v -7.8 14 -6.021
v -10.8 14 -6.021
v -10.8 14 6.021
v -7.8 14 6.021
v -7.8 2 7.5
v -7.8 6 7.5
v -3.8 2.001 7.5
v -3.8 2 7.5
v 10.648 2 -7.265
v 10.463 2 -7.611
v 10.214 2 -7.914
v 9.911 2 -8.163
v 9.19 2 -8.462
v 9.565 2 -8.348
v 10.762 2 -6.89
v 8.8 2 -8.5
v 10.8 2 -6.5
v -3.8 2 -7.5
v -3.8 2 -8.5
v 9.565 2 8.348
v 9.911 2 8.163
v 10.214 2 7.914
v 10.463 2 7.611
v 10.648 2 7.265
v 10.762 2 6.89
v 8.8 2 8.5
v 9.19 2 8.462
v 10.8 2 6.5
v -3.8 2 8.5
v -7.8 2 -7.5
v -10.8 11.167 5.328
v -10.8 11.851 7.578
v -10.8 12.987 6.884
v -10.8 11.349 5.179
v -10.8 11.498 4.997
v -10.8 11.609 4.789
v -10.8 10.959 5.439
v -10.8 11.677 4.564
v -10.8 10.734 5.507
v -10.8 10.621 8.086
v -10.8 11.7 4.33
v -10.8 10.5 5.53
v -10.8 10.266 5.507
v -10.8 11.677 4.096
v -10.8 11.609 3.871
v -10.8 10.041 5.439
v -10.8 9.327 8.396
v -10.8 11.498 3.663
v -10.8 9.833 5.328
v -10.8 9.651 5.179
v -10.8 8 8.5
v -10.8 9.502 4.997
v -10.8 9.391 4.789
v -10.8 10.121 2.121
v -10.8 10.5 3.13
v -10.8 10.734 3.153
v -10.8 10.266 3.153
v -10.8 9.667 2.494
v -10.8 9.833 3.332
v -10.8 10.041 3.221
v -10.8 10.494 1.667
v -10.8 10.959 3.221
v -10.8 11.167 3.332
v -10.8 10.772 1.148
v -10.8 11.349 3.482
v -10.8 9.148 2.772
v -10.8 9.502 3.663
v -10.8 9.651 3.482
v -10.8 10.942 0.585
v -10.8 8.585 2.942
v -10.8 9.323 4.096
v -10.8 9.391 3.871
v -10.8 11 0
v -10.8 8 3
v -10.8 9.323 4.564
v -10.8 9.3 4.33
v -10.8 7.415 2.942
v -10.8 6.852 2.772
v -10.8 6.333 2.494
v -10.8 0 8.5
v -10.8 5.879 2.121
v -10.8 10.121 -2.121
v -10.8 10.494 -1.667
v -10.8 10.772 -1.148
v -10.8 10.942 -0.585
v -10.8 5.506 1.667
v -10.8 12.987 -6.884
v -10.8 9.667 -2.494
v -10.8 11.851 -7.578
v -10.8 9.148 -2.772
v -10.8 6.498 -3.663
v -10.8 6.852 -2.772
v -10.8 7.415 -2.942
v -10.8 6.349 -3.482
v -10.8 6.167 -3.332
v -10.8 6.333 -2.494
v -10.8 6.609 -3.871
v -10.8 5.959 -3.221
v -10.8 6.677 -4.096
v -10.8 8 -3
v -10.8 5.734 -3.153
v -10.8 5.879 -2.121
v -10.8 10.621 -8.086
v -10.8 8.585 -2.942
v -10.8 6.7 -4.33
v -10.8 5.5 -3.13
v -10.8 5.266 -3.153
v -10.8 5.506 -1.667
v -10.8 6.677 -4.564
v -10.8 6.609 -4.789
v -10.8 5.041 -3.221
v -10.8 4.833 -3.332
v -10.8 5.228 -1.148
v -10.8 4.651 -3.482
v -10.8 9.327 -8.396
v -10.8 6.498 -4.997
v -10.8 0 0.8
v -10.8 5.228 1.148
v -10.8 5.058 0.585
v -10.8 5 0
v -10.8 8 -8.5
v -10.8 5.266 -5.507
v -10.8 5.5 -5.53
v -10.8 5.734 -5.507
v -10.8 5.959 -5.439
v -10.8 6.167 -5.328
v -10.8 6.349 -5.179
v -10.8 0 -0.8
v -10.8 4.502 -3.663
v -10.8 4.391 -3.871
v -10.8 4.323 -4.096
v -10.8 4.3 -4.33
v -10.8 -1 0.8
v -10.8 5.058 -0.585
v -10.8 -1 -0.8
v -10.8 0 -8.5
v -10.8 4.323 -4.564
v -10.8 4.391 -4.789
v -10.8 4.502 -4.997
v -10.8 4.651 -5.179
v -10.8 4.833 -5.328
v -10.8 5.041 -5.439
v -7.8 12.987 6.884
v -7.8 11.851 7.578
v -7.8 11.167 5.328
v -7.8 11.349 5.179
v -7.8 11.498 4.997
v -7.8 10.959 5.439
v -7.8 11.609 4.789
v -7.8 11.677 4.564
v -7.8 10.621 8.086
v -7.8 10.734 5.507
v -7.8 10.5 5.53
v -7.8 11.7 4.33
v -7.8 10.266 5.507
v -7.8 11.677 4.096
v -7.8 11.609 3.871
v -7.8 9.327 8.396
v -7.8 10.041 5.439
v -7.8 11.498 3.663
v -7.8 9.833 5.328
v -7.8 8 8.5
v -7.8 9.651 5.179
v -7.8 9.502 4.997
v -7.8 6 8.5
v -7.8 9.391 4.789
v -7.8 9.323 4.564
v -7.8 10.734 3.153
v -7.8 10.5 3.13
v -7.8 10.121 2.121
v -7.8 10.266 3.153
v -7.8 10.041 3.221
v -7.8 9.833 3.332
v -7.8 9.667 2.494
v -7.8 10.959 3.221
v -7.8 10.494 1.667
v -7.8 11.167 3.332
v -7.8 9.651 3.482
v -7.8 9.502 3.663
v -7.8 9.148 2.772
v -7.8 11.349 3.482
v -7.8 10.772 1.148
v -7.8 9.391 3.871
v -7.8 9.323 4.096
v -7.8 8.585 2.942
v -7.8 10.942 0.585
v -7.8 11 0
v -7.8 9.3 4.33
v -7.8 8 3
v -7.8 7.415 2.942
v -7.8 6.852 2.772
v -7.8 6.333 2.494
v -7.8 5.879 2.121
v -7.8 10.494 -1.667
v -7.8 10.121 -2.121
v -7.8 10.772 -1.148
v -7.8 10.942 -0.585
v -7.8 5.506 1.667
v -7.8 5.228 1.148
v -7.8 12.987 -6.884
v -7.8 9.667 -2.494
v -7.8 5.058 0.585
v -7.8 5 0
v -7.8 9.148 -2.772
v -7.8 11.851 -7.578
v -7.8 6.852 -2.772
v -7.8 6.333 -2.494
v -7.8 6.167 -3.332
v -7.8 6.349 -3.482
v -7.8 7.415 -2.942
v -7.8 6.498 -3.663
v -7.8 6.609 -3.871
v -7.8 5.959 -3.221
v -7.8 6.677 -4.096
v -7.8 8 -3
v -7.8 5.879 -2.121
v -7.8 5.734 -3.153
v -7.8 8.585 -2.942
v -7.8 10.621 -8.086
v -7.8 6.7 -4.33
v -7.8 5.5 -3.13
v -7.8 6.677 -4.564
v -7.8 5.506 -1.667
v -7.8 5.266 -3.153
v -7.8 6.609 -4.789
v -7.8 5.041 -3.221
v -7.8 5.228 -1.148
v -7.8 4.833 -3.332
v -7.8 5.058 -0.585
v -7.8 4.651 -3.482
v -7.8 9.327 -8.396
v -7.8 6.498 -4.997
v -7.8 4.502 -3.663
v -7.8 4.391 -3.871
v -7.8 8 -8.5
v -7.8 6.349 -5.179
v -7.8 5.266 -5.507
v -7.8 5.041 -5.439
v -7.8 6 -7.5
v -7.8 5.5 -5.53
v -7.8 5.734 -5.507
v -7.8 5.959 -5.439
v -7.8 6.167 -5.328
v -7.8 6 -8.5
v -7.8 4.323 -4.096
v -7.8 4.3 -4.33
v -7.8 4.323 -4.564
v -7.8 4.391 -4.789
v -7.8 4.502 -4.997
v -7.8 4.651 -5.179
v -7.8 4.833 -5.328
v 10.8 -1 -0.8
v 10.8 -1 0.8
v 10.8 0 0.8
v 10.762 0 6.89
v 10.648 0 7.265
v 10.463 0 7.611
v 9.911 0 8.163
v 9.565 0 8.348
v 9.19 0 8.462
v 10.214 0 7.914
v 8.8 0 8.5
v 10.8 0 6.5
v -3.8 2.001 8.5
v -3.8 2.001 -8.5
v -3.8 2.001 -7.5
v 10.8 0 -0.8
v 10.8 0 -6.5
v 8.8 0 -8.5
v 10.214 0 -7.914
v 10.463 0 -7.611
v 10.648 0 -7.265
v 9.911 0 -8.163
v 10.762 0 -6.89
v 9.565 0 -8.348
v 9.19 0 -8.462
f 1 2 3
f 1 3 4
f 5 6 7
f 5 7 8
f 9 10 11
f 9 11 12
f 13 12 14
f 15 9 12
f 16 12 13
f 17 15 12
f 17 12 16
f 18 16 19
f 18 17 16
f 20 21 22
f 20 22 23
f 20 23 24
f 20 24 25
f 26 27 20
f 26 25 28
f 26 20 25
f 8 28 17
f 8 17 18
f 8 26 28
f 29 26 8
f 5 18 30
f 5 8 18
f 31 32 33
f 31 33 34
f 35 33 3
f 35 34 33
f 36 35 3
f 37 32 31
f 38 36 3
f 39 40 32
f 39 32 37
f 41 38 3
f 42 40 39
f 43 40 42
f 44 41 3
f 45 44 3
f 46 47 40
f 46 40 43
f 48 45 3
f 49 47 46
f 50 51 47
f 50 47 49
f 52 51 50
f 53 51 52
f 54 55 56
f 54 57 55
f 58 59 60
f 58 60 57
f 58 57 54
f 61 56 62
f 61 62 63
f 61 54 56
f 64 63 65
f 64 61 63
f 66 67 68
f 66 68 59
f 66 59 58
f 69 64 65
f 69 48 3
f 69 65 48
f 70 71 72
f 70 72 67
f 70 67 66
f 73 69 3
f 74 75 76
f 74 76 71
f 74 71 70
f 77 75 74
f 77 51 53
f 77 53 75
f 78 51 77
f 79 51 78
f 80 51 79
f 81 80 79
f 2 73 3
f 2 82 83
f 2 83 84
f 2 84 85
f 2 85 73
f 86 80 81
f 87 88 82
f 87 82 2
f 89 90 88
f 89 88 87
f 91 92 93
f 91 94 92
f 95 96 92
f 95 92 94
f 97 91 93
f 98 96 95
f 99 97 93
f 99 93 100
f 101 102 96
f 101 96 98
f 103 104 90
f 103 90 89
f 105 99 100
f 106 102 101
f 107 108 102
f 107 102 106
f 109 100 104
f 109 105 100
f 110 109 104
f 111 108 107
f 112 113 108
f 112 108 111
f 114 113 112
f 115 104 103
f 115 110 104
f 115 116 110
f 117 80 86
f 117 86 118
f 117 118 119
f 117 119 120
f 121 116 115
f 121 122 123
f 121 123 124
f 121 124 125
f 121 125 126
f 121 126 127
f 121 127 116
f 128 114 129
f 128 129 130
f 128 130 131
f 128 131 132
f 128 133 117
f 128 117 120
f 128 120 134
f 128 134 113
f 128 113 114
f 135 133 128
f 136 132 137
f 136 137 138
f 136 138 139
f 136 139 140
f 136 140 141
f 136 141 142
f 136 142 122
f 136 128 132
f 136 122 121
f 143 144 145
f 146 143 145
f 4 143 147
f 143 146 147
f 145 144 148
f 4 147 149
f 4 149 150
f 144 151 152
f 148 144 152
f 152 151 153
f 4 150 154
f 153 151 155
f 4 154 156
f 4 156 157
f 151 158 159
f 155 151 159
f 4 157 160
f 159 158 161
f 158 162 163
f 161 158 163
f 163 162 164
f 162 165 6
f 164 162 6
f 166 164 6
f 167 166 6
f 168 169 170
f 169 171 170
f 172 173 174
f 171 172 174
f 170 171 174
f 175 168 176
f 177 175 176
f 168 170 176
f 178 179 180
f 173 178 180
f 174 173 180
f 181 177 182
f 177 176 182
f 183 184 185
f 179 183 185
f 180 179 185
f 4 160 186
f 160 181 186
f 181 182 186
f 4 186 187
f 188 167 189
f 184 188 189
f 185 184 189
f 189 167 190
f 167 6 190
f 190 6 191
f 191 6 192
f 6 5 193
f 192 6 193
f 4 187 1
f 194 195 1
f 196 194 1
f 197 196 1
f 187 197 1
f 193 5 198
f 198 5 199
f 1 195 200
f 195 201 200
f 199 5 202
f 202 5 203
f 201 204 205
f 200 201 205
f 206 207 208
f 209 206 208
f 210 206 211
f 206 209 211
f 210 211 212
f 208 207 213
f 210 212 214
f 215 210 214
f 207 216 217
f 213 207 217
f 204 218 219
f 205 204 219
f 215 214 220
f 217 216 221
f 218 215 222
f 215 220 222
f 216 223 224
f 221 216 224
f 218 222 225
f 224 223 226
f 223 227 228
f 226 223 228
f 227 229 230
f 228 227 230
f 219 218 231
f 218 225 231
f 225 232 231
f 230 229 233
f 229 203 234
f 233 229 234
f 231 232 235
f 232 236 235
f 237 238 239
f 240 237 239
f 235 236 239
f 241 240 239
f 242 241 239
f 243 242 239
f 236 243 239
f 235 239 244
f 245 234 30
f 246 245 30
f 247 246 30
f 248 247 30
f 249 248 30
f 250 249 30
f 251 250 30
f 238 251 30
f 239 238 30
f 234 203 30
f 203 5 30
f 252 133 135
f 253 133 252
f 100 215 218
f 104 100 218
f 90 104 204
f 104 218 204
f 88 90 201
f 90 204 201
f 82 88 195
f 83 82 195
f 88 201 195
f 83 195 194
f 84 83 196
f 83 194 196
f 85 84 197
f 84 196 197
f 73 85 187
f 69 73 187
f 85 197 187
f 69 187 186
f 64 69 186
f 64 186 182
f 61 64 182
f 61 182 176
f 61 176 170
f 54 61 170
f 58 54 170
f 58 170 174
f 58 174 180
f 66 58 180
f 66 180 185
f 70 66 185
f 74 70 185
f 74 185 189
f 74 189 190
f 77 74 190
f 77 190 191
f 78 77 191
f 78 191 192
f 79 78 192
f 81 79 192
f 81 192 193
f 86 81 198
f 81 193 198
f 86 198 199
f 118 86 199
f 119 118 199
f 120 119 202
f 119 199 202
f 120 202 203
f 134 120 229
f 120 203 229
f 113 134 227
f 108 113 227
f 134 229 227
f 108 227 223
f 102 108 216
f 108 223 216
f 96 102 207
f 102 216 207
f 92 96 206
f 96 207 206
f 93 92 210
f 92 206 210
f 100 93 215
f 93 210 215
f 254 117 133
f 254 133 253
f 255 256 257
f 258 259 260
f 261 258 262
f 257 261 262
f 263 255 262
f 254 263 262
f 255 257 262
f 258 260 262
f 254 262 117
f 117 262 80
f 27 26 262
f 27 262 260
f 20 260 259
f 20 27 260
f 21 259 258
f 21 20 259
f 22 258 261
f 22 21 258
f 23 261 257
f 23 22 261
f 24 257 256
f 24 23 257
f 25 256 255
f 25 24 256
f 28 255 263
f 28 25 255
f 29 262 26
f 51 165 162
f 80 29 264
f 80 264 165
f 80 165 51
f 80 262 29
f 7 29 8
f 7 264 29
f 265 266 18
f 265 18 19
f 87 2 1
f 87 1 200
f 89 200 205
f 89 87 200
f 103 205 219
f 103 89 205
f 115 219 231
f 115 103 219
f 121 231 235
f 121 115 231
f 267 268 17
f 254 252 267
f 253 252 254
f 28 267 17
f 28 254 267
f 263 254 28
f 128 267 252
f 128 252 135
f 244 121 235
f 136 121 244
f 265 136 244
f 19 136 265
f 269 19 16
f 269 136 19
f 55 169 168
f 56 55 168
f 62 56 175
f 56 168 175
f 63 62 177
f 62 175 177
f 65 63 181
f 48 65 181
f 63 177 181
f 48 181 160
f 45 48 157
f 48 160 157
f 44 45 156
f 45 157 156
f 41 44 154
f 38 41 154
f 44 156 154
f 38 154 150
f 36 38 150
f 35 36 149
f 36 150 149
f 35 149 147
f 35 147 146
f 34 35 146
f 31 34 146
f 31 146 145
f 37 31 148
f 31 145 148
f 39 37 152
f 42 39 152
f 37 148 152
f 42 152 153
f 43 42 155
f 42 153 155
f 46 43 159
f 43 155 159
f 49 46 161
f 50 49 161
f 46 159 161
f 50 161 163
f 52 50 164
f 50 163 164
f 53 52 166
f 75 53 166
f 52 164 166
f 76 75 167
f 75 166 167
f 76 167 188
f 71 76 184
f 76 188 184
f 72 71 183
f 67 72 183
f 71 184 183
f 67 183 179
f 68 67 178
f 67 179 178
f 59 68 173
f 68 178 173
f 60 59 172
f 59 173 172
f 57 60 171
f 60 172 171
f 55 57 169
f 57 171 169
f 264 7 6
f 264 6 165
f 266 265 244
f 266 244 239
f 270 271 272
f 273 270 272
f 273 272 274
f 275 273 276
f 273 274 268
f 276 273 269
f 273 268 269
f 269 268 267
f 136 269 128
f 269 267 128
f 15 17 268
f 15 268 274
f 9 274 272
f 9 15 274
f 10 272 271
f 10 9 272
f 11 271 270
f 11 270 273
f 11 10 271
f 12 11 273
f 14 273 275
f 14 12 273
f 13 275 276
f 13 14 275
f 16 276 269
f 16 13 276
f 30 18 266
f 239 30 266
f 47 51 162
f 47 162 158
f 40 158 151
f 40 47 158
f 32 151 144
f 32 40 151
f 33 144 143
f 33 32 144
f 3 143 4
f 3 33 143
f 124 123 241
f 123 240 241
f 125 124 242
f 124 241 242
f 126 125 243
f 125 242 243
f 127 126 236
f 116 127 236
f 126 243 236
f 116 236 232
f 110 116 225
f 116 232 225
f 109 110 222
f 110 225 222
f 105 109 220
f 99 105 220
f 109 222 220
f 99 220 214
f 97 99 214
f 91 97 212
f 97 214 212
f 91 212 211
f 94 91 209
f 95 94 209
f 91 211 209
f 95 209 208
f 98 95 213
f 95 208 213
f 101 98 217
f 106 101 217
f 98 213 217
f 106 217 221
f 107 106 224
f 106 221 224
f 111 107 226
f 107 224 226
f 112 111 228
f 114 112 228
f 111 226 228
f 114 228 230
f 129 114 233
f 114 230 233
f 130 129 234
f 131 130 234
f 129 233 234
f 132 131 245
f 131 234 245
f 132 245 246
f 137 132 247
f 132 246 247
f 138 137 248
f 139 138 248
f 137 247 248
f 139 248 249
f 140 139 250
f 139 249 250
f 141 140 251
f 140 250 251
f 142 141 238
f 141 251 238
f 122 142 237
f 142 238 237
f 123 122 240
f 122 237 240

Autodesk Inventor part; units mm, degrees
ref_plane "YZ Plane" through (0, 0, 0) normal (1, 0, 0) x (0, 1, 0)
ref_plane "XZ Plane" through (0, 0, 0) normal (0, 1, 0) x (-1, 0, 0)
ref_plane "XY Plane" through (0, 0, 0) normal (0, 0, 1) x (1, 0, 0)
sketch "Sketch1" plane through (0, 0, 0) normal (0, 1, 0) x (-1, 0, 0)
  line L0 (-10.8, 8.5) -> (10.8, 8.5)
  line L1 (10.8, 8.5) -> (10.8, -8.5)
  line L2 (10.8, -8.5) -> (-10.8, -8.5)
  line L3 (-10.8, -8.5) -> (-10.8, 8.5)
  line L4 (-10.8, 8.5) -> (10.8, -8.5) construction
  line L5 (10.8, 8.5) -> (-10.8, -8.5) construction
  point P0 (0, 0)
  dimension "d0" = 21.6
  dimension "d1" = 17
extrude "Extrusion1" add sketch "Sketch1" along normal blind 2
sketch "Sketch2" plane through (0, 2, 0) normal (0, 1, 0) x (1, 0, 0)
  line L0 (-10.8, 8.5) -> (-10.8, -8.5) projected
  line L1 (-10.8, -8.5) -> (-7.8, -8.5)
  line L2 (-7.8, -8.5) -> (-7.8, 8.5)
  line L3 (-7.8, 8.5) -> (-10.8, 8.5)
  line L4 (-10.8, 8.5) -> (-10.8, -8.5)
  point P0 (0, 0)
  point P1 (-10.8, 0)
  point P2 (-10.8, 8.5)
  dimension "d4" = 3
  dimension "d5" = 17
extrude "Extrusion2" add sketch "Sketch2" along normal blind 12
sketch "Sketch3" plane through (-7.8, 2, 8.5) normal (1, 0, 0) x (0, 0, -1)
  circle A0 centre (8.5, 6) radius 3
  line L0 (0, 12) -> (17, 12) projected
  line L1 (17, 0) -> (17, 12) projected
  circle A1 centre (4.1699, 8.5) radius 1.2
  line L2 (0, -2) -> (0, 12) projected
  line L3 (0, 6) -> (17, 6) construction
  line L4 (1.8753, 9.8248) -> (15.1247, 2.1752) construction
  circle A2 centre (12.8301, 3.5) radius 1.2
  point P0 (8.5, -2)
  point P1 (8.5, 6)
  dimension "d8" = 6
  dimension "d9" = 6
  dimension "d10" = 8.5
  dimension "d11" = 2.4
  dimension "d12" = -30
  dimension "d13" = 5
  dimension "d14" = 2.4
  dimension "d15" = 5
extrude "Extrusion3" cut sketch "Sketch3" against normal blind 5
sketch "Sketch4" plane through (-10.8, 0, -8.5) normal (-1, 0, 0) x (0, 0, 1)
  circle A0 centre (8.5, 8) radius 3 projected
  circle A1 centre (8.5, 8) radius 8.5
  line L0 (0, 0) -> (0, 14) projected
  circle A2 centre (8.5, 8) radius 12.6892
  line L1 (8.5, 8) -> (-4.1892, 8)
  line L2 (8.5, 8) -> (21.1892, 8)
  point P0 (8.5, 0)
  point P1 (17, 8)
  point P2 (0, 8)
  dimension "d18" = 17
extrude "Extrusion4" cut sketch "Sketch4" against normal blind 5 contours A1 L1 A2 L2 picked at (-2.5876, 9.6903)
sketch "Sketch5" plane through (-10.8, 0, -8.5) normal (-1, 0, 0) x (0, 0, 1)
  circle A0 centre (4.1699, 5.5) radius 1.2 projected
  circle A1 centre (12.8301, 10.5) radius 1.2 projected
  line L0 (4.1699, 5.5) -> (12.8301, 10.5) construction
  point P0 (8.5, 0)
  point P1 (8.5, 8)
extrude "Extrusion6" cut sketch "Sketch5" against normal blind 0.4
sketch "Sketch7" plane through (0, 0, 0) normal (0, -1, 0) x (1, 0, 0)
  line L0 (-10.8, -8.5) -> (-10.8, 8.5) projected
  line L1 (-10.8, 0.8) -> (10.8, 0.8)
  line L2 (10.8, 0.8) -> (10.8, -0.8)
  line L3 (10.8, -0.8) -> (-10.8, -0.8)
  line L4 (-10.8, -0.8) -> (-10.8, 0.8)
  line L5 (10.8, 8.5) -> (10.8, -8.5) projected
  point P0 (0, 0)
  dimension "d27" = 1.6
  dimension "d28" = 0.8
extrude "Extrusion7" add sketch "Sketch7" along normal blind 1
fillet "Fillet1" radius 2 2 edges at (10.8, 1, -8.5) (10.8, 1, 8.5)
sketch "Sketch9" plane through (-7.8, 2, 8.5) normal (1, 0, 0) x (0, 0, -1)
  line L0 (17, 0) -> (16, 0)
  line L1 (16, 0) -> (16, 4)
  line L2 (16, 4) -> (17, 4)
  line L3 (17, 4) -> (17, 0)
  point P0 (8.5, -2)
  dimension "d36" = 1
  dimension "d37" = 4
extrude "Extrusion9" add sketch "Sketch9" along normal blind 4
chamfer "Chamfer2" distance 4 angle 45 1 edges at (-3.8, 6, -8)
mirror "Mirror2" about plane through (0, 0, 0) normal (0, 0, 1) of "Extrusion9", "Chamfer2"
properties part number "Trzymak2"
